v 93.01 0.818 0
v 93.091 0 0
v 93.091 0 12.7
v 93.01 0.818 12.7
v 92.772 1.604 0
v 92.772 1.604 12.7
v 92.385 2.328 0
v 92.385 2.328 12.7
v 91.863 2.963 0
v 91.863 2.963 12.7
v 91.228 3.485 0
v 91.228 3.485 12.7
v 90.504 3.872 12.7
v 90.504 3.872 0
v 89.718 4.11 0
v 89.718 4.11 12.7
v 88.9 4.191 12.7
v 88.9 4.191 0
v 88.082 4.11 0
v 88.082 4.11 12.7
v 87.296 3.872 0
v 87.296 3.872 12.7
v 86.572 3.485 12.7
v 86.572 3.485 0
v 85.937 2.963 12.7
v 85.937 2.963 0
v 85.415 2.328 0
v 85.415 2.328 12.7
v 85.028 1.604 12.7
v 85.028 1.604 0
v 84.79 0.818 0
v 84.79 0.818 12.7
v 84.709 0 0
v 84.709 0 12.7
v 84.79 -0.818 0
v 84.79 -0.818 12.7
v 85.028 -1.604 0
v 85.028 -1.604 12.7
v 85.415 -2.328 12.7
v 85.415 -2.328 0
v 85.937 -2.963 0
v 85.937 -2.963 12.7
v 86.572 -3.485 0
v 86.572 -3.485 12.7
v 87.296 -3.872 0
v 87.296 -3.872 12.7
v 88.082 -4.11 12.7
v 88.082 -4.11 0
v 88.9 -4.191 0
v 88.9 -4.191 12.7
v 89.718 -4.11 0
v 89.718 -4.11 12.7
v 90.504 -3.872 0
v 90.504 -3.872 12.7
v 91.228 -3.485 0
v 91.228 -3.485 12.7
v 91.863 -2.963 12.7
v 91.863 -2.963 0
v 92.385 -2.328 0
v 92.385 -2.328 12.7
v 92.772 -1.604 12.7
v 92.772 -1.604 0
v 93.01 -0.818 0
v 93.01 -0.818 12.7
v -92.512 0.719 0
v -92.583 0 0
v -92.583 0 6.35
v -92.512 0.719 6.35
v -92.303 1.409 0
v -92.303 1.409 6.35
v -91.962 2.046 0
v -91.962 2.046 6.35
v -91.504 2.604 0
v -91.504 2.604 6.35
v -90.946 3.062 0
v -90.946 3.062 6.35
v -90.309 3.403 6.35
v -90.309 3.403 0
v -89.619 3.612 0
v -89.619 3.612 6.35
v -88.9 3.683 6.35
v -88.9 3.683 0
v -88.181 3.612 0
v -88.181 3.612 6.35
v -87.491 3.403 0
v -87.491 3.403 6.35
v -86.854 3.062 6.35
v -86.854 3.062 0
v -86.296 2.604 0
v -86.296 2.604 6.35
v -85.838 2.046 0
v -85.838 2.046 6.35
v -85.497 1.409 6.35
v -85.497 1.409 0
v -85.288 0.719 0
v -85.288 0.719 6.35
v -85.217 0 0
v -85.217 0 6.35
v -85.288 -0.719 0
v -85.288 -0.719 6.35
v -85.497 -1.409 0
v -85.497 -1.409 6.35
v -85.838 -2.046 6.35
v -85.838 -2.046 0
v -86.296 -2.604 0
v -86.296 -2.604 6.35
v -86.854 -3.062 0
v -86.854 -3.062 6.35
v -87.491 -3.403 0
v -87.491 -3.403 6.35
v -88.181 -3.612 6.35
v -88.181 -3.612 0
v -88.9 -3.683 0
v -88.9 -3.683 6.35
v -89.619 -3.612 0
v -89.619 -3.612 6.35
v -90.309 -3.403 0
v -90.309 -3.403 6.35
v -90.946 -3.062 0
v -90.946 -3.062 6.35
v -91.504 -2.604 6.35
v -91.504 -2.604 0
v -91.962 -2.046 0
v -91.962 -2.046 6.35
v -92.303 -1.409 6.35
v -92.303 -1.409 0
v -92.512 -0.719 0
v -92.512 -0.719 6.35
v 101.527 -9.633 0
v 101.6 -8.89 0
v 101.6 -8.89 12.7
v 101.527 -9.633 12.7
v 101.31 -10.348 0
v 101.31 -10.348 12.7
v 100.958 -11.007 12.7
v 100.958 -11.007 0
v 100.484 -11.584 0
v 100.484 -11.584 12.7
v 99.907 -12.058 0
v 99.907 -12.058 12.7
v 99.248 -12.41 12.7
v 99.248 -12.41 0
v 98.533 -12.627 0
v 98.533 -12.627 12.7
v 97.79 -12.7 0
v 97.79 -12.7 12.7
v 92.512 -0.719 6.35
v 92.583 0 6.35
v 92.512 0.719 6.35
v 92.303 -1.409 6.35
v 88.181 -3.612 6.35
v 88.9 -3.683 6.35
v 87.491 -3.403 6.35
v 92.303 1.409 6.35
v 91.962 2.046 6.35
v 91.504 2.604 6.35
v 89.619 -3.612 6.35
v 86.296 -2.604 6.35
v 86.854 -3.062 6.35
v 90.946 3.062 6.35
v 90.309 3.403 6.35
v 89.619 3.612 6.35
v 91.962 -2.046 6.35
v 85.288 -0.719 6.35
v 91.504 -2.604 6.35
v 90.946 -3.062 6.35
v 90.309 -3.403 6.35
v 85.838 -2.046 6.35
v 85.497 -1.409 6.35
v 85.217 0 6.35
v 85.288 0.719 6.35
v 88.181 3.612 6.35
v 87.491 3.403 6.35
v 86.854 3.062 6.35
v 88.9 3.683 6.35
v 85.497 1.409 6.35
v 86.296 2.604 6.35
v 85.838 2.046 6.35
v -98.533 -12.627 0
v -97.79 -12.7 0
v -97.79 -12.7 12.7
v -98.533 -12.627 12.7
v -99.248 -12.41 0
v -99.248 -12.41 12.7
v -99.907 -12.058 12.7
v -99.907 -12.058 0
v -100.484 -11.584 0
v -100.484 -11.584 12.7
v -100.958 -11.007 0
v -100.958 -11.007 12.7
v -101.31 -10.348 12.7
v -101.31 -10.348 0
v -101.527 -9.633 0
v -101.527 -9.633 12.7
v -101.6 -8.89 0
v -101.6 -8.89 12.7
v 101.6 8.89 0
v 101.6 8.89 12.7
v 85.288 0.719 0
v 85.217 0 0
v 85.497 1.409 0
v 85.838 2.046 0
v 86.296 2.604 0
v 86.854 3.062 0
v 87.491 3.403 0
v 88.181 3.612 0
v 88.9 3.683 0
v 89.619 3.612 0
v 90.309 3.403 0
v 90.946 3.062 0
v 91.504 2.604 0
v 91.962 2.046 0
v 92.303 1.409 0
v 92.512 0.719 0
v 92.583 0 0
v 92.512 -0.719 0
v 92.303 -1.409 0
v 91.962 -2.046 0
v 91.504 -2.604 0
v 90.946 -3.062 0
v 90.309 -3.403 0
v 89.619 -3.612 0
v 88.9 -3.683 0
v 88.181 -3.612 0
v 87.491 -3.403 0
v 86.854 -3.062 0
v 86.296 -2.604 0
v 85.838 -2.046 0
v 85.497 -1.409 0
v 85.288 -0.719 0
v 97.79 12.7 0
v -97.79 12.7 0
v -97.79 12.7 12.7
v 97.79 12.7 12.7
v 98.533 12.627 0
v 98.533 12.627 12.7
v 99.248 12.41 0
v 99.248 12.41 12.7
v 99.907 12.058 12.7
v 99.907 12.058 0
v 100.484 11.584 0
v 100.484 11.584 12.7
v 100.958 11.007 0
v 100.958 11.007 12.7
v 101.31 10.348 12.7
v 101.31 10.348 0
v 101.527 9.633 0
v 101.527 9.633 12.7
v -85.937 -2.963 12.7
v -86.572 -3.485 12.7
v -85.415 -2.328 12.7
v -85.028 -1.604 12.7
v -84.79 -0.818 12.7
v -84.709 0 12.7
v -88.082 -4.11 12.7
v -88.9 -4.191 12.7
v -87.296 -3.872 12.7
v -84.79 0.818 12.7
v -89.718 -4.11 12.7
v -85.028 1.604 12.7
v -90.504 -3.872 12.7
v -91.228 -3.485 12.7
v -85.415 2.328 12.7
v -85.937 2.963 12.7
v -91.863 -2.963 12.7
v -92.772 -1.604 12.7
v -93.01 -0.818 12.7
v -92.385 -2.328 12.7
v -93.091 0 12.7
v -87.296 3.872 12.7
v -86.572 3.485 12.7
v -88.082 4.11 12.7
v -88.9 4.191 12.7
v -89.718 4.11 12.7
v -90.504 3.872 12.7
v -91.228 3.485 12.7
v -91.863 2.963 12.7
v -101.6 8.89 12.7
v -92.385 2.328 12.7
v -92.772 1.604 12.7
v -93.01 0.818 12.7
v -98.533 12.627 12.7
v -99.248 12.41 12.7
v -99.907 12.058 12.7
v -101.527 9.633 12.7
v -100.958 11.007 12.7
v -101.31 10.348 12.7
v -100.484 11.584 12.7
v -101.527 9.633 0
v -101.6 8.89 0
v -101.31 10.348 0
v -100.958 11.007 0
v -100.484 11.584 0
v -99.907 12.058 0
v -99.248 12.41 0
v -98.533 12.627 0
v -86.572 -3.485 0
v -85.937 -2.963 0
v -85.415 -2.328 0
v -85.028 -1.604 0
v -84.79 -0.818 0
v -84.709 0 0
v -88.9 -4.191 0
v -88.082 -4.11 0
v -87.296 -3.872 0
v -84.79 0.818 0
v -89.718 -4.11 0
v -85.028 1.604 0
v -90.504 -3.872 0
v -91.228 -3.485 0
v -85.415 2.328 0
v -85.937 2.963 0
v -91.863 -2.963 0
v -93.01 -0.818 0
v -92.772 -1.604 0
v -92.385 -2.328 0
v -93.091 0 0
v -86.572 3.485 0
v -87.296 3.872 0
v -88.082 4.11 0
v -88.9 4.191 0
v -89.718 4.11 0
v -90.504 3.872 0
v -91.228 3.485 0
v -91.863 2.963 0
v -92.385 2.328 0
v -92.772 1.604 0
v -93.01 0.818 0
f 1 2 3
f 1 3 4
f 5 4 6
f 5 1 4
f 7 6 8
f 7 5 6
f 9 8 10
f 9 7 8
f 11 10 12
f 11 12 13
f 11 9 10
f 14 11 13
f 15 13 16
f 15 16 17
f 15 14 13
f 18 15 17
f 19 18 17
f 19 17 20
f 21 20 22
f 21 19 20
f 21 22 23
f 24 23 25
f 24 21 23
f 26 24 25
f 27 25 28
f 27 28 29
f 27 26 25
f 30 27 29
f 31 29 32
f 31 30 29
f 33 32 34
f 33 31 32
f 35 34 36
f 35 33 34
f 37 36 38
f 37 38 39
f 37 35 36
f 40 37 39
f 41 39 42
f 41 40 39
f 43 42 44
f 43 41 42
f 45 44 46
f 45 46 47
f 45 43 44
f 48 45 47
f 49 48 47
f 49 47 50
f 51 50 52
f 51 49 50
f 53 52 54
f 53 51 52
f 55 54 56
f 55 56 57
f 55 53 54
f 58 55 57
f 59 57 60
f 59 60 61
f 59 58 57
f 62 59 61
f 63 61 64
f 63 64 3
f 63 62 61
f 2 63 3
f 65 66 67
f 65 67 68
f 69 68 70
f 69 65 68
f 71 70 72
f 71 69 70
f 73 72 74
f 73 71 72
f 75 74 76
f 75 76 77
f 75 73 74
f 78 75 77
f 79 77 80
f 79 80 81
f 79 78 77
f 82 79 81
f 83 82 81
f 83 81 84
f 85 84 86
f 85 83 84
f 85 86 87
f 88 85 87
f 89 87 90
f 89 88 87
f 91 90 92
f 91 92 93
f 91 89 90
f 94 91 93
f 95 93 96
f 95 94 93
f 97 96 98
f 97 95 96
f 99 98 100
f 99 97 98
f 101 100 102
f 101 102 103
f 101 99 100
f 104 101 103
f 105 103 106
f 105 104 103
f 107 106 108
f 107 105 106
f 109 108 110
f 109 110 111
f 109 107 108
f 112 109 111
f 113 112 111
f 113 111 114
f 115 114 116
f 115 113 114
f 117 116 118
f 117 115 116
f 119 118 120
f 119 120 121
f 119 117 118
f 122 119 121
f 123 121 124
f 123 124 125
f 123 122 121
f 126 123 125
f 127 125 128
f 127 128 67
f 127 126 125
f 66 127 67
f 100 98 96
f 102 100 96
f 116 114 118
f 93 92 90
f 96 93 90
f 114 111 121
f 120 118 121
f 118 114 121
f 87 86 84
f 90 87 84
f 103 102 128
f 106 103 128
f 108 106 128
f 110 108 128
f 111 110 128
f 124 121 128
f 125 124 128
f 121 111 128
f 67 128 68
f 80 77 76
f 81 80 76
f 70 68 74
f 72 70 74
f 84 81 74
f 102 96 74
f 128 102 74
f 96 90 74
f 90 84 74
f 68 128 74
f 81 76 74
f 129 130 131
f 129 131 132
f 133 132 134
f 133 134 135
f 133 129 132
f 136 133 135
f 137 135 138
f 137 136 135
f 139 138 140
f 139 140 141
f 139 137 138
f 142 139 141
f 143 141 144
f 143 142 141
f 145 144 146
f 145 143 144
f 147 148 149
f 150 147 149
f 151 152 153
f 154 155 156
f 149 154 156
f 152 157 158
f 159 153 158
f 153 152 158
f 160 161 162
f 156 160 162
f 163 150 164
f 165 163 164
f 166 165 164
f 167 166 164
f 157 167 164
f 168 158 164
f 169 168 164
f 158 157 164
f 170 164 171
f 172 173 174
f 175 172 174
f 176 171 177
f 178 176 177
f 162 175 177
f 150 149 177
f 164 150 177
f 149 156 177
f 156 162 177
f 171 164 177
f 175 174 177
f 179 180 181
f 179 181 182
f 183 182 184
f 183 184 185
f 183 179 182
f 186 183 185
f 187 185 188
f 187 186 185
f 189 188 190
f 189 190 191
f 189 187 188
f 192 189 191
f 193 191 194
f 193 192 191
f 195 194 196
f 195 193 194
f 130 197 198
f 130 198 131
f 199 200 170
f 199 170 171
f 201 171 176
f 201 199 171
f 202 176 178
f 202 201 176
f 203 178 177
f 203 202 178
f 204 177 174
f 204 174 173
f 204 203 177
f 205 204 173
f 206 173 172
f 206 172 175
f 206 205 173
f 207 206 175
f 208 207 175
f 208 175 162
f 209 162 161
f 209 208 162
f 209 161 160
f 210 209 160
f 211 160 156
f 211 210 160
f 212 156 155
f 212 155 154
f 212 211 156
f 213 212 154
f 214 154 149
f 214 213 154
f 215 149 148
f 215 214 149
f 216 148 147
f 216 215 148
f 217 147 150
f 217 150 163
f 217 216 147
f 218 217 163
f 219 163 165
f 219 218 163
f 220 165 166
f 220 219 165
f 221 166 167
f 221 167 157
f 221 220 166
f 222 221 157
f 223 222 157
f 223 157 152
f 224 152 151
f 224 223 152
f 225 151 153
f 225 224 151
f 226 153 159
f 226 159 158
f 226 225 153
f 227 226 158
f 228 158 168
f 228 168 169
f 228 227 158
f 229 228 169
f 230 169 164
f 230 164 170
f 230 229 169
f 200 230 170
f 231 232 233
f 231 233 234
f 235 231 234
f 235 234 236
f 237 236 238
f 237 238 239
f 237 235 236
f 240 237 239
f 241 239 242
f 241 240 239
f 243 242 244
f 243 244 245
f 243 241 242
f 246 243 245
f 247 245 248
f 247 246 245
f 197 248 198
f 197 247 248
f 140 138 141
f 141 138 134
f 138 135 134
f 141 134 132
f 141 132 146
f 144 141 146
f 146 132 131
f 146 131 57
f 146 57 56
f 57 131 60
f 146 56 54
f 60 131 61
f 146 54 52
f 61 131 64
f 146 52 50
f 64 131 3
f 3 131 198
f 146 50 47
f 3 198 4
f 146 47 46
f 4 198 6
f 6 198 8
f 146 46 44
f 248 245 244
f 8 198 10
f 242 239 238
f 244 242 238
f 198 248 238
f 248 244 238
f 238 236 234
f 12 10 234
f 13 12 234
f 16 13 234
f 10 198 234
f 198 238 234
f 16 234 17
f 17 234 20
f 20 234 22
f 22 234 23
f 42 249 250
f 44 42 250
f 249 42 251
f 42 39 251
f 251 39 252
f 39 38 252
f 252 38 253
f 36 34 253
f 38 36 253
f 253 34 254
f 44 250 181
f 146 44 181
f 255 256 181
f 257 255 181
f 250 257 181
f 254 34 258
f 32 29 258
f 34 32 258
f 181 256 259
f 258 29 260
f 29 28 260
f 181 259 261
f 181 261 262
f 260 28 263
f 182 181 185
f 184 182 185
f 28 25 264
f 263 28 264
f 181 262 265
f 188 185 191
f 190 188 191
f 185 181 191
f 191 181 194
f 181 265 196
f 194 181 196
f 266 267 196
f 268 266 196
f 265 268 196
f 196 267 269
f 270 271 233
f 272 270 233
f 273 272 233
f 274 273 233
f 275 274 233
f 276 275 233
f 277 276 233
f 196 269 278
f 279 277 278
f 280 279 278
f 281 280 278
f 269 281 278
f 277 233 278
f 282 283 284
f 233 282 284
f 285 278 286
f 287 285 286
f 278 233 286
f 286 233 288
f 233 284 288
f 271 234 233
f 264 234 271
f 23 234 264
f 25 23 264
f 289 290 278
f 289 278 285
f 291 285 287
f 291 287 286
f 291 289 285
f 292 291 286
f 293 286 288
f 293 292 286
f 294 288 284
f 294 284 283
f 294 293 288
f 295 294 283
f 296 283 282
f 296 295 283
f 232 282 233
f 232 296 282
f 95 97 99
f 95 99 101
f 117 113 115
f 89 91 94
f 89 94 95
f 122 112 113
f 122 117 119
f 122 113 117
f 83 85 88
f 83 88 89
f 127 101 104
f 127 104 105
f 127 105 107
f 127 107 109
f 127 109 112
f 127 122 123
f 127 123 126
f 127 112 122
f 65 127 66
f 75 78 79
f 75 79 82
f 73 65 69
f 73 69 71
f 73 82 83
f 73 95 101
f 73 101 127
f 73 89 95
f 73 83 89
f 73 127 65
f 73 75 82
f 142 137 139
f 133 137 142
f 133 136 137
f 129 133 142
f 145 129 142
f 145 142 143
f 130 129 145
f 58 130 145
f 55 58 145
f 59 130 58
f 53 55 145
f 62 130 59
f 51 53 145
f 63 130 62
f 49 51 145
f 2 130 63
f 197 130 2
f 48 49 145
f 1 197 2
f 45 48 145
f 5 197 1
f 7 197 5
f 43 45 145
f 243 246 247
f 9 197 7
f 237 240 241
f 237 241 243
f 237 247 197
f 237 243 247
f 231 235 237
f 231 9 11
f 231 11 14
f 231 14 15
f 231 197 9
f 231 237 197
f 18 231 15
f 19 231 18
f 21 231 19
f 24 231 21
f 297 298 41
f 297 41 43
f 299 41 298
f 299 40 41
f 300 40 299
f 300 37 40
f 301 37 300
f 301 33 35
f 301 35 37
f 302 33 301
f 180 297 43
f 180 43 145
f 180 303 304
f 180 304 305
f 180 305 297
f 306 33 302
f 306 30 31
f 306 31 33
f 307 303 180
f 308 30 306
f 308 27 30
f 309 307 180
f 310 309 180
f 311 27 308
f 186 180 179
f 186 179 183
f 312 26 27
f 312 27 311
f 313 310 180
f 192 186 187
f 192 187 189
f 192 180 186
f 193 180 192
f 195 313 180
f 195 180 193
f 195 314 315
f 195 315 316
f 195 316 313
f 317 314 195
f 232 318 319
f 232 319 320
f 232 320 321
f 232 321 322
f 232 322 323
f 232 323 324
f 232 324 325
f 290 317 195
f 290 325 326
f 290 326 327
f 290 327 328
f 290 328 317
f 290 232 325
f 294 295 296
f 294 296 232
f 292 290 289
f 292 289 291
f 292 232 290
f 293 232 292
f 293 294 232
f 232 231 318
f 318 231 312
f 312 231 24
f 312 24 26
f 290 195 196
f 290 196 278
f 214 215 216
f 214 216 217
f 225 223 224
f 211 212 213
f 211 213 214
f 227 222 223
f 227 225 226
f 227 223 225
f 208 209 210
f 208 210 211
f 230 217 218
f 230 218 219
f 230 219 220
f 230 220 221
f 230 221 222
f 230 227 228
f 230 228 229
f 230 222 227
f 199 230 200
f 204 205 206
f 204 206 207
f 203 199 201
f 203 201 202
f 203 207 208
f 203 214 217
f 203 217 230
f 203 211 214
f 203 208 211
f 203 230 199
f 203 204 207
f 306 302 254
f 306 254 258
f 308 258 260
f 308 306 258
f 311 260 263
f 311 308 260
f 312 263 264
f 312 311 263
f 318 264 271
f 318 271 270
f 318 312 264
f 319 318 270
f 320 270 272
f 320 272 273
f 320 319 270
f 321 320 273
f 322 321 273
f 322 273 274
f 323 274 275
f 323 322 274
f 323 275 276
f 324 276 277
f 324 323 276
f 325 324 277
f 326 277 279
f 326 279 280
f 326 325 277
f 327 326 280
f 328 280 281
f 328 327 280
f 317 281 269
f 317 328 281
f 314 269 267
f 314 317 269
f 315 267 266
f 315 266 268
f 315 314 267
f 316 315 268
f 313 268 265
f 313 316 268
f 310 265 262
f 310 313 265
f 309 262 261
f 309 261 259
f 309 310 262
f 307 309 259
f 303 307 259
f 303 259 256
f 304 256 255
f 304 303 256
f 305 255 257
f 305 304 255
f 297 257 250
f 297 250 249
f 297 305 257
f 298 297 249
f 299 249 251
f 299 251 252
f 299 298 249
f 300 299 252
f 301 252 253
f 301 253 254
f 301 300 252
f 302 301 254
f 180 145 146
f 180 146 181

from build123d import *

# Parameters (mm, degrees)
SKETCH1_R             = 4.191
BOSS_EXTRUDE1_DEPTH   = 12.7
SKETCH2_R             = 3.683
BOSS_EXTRUDE2_DEPTH   = 6.35
BOSS_EXTRUDE2_2_DEPTH = 6.35


with BuildPart() as part:
    # Sketch1 → Boss-Extrude1 (new body)
    with BuildSketch(Plane.XY):
        with BuildLine():
            Line((97.79, -12.7), (-97.79, -12.7))
            ThreePointArc((-97.79, -12.7), (-100.484076836, -11.584076836), (-101.6, -8.89))
            Line((-101.6, -8.89), (-101.6, 8.89))
            ThreePointArc((-101.6, 8.89), (-100.484076836, 11.584076836), (-97.79, 12.7))
            Line((-97.79, 12.7), (97.79, 12.7))
            ThreePointArc((97.79, 12.7), (100.484076836, 11.584076836), (101.6, 8.89))
            Line((101.6, 8.89), (101.6, -8.89))
            ThreePointArc((101.6, -8.89), (100.484076836, -11.584076836), (97.79, -12.7))
        make_face()
        with Locations((-88.9, 0)):
            Circle(SKETCH1_R, mode=Mode.SUBTRACT)
        with Locations((88.9, 0)):
            Circle(SKETCH1_R, mode=Mode.SUBTRACT)
    extrude(amount=BOSS_EXTRUDE1_DEPTH)


with BuildPart() as body_2:
    # Sketch2 → Boss-Extrude2 (new body)
    with BuildSketch(Plane(origin=(0, 0, 0), x_dir=(-1, 0, 0), z_dir=(0, 0, -1))):
        with Locations((-88.9, 0)):
            Circle(SKETCH2_R)
    extrude(amount=-BOSS_EXTRUDE2_DEPTH)


with BuildPart() as body_3:
    # Sketch2 → Boss-Extrude2 2 (new body)
    with BuildSketch(Plane(origin=(0, 0, 0), x_dir=(-1, 0, 0), z_dir=(0, 0, -1))):
        with Locations((88.9, 0)):
            Circle(SKETCH2_R)
    extrude(amount=-BOSS_EXTRUDE2_2_DEPTH)


solid = Compound([part.part, body_2.part, body_3.part])
